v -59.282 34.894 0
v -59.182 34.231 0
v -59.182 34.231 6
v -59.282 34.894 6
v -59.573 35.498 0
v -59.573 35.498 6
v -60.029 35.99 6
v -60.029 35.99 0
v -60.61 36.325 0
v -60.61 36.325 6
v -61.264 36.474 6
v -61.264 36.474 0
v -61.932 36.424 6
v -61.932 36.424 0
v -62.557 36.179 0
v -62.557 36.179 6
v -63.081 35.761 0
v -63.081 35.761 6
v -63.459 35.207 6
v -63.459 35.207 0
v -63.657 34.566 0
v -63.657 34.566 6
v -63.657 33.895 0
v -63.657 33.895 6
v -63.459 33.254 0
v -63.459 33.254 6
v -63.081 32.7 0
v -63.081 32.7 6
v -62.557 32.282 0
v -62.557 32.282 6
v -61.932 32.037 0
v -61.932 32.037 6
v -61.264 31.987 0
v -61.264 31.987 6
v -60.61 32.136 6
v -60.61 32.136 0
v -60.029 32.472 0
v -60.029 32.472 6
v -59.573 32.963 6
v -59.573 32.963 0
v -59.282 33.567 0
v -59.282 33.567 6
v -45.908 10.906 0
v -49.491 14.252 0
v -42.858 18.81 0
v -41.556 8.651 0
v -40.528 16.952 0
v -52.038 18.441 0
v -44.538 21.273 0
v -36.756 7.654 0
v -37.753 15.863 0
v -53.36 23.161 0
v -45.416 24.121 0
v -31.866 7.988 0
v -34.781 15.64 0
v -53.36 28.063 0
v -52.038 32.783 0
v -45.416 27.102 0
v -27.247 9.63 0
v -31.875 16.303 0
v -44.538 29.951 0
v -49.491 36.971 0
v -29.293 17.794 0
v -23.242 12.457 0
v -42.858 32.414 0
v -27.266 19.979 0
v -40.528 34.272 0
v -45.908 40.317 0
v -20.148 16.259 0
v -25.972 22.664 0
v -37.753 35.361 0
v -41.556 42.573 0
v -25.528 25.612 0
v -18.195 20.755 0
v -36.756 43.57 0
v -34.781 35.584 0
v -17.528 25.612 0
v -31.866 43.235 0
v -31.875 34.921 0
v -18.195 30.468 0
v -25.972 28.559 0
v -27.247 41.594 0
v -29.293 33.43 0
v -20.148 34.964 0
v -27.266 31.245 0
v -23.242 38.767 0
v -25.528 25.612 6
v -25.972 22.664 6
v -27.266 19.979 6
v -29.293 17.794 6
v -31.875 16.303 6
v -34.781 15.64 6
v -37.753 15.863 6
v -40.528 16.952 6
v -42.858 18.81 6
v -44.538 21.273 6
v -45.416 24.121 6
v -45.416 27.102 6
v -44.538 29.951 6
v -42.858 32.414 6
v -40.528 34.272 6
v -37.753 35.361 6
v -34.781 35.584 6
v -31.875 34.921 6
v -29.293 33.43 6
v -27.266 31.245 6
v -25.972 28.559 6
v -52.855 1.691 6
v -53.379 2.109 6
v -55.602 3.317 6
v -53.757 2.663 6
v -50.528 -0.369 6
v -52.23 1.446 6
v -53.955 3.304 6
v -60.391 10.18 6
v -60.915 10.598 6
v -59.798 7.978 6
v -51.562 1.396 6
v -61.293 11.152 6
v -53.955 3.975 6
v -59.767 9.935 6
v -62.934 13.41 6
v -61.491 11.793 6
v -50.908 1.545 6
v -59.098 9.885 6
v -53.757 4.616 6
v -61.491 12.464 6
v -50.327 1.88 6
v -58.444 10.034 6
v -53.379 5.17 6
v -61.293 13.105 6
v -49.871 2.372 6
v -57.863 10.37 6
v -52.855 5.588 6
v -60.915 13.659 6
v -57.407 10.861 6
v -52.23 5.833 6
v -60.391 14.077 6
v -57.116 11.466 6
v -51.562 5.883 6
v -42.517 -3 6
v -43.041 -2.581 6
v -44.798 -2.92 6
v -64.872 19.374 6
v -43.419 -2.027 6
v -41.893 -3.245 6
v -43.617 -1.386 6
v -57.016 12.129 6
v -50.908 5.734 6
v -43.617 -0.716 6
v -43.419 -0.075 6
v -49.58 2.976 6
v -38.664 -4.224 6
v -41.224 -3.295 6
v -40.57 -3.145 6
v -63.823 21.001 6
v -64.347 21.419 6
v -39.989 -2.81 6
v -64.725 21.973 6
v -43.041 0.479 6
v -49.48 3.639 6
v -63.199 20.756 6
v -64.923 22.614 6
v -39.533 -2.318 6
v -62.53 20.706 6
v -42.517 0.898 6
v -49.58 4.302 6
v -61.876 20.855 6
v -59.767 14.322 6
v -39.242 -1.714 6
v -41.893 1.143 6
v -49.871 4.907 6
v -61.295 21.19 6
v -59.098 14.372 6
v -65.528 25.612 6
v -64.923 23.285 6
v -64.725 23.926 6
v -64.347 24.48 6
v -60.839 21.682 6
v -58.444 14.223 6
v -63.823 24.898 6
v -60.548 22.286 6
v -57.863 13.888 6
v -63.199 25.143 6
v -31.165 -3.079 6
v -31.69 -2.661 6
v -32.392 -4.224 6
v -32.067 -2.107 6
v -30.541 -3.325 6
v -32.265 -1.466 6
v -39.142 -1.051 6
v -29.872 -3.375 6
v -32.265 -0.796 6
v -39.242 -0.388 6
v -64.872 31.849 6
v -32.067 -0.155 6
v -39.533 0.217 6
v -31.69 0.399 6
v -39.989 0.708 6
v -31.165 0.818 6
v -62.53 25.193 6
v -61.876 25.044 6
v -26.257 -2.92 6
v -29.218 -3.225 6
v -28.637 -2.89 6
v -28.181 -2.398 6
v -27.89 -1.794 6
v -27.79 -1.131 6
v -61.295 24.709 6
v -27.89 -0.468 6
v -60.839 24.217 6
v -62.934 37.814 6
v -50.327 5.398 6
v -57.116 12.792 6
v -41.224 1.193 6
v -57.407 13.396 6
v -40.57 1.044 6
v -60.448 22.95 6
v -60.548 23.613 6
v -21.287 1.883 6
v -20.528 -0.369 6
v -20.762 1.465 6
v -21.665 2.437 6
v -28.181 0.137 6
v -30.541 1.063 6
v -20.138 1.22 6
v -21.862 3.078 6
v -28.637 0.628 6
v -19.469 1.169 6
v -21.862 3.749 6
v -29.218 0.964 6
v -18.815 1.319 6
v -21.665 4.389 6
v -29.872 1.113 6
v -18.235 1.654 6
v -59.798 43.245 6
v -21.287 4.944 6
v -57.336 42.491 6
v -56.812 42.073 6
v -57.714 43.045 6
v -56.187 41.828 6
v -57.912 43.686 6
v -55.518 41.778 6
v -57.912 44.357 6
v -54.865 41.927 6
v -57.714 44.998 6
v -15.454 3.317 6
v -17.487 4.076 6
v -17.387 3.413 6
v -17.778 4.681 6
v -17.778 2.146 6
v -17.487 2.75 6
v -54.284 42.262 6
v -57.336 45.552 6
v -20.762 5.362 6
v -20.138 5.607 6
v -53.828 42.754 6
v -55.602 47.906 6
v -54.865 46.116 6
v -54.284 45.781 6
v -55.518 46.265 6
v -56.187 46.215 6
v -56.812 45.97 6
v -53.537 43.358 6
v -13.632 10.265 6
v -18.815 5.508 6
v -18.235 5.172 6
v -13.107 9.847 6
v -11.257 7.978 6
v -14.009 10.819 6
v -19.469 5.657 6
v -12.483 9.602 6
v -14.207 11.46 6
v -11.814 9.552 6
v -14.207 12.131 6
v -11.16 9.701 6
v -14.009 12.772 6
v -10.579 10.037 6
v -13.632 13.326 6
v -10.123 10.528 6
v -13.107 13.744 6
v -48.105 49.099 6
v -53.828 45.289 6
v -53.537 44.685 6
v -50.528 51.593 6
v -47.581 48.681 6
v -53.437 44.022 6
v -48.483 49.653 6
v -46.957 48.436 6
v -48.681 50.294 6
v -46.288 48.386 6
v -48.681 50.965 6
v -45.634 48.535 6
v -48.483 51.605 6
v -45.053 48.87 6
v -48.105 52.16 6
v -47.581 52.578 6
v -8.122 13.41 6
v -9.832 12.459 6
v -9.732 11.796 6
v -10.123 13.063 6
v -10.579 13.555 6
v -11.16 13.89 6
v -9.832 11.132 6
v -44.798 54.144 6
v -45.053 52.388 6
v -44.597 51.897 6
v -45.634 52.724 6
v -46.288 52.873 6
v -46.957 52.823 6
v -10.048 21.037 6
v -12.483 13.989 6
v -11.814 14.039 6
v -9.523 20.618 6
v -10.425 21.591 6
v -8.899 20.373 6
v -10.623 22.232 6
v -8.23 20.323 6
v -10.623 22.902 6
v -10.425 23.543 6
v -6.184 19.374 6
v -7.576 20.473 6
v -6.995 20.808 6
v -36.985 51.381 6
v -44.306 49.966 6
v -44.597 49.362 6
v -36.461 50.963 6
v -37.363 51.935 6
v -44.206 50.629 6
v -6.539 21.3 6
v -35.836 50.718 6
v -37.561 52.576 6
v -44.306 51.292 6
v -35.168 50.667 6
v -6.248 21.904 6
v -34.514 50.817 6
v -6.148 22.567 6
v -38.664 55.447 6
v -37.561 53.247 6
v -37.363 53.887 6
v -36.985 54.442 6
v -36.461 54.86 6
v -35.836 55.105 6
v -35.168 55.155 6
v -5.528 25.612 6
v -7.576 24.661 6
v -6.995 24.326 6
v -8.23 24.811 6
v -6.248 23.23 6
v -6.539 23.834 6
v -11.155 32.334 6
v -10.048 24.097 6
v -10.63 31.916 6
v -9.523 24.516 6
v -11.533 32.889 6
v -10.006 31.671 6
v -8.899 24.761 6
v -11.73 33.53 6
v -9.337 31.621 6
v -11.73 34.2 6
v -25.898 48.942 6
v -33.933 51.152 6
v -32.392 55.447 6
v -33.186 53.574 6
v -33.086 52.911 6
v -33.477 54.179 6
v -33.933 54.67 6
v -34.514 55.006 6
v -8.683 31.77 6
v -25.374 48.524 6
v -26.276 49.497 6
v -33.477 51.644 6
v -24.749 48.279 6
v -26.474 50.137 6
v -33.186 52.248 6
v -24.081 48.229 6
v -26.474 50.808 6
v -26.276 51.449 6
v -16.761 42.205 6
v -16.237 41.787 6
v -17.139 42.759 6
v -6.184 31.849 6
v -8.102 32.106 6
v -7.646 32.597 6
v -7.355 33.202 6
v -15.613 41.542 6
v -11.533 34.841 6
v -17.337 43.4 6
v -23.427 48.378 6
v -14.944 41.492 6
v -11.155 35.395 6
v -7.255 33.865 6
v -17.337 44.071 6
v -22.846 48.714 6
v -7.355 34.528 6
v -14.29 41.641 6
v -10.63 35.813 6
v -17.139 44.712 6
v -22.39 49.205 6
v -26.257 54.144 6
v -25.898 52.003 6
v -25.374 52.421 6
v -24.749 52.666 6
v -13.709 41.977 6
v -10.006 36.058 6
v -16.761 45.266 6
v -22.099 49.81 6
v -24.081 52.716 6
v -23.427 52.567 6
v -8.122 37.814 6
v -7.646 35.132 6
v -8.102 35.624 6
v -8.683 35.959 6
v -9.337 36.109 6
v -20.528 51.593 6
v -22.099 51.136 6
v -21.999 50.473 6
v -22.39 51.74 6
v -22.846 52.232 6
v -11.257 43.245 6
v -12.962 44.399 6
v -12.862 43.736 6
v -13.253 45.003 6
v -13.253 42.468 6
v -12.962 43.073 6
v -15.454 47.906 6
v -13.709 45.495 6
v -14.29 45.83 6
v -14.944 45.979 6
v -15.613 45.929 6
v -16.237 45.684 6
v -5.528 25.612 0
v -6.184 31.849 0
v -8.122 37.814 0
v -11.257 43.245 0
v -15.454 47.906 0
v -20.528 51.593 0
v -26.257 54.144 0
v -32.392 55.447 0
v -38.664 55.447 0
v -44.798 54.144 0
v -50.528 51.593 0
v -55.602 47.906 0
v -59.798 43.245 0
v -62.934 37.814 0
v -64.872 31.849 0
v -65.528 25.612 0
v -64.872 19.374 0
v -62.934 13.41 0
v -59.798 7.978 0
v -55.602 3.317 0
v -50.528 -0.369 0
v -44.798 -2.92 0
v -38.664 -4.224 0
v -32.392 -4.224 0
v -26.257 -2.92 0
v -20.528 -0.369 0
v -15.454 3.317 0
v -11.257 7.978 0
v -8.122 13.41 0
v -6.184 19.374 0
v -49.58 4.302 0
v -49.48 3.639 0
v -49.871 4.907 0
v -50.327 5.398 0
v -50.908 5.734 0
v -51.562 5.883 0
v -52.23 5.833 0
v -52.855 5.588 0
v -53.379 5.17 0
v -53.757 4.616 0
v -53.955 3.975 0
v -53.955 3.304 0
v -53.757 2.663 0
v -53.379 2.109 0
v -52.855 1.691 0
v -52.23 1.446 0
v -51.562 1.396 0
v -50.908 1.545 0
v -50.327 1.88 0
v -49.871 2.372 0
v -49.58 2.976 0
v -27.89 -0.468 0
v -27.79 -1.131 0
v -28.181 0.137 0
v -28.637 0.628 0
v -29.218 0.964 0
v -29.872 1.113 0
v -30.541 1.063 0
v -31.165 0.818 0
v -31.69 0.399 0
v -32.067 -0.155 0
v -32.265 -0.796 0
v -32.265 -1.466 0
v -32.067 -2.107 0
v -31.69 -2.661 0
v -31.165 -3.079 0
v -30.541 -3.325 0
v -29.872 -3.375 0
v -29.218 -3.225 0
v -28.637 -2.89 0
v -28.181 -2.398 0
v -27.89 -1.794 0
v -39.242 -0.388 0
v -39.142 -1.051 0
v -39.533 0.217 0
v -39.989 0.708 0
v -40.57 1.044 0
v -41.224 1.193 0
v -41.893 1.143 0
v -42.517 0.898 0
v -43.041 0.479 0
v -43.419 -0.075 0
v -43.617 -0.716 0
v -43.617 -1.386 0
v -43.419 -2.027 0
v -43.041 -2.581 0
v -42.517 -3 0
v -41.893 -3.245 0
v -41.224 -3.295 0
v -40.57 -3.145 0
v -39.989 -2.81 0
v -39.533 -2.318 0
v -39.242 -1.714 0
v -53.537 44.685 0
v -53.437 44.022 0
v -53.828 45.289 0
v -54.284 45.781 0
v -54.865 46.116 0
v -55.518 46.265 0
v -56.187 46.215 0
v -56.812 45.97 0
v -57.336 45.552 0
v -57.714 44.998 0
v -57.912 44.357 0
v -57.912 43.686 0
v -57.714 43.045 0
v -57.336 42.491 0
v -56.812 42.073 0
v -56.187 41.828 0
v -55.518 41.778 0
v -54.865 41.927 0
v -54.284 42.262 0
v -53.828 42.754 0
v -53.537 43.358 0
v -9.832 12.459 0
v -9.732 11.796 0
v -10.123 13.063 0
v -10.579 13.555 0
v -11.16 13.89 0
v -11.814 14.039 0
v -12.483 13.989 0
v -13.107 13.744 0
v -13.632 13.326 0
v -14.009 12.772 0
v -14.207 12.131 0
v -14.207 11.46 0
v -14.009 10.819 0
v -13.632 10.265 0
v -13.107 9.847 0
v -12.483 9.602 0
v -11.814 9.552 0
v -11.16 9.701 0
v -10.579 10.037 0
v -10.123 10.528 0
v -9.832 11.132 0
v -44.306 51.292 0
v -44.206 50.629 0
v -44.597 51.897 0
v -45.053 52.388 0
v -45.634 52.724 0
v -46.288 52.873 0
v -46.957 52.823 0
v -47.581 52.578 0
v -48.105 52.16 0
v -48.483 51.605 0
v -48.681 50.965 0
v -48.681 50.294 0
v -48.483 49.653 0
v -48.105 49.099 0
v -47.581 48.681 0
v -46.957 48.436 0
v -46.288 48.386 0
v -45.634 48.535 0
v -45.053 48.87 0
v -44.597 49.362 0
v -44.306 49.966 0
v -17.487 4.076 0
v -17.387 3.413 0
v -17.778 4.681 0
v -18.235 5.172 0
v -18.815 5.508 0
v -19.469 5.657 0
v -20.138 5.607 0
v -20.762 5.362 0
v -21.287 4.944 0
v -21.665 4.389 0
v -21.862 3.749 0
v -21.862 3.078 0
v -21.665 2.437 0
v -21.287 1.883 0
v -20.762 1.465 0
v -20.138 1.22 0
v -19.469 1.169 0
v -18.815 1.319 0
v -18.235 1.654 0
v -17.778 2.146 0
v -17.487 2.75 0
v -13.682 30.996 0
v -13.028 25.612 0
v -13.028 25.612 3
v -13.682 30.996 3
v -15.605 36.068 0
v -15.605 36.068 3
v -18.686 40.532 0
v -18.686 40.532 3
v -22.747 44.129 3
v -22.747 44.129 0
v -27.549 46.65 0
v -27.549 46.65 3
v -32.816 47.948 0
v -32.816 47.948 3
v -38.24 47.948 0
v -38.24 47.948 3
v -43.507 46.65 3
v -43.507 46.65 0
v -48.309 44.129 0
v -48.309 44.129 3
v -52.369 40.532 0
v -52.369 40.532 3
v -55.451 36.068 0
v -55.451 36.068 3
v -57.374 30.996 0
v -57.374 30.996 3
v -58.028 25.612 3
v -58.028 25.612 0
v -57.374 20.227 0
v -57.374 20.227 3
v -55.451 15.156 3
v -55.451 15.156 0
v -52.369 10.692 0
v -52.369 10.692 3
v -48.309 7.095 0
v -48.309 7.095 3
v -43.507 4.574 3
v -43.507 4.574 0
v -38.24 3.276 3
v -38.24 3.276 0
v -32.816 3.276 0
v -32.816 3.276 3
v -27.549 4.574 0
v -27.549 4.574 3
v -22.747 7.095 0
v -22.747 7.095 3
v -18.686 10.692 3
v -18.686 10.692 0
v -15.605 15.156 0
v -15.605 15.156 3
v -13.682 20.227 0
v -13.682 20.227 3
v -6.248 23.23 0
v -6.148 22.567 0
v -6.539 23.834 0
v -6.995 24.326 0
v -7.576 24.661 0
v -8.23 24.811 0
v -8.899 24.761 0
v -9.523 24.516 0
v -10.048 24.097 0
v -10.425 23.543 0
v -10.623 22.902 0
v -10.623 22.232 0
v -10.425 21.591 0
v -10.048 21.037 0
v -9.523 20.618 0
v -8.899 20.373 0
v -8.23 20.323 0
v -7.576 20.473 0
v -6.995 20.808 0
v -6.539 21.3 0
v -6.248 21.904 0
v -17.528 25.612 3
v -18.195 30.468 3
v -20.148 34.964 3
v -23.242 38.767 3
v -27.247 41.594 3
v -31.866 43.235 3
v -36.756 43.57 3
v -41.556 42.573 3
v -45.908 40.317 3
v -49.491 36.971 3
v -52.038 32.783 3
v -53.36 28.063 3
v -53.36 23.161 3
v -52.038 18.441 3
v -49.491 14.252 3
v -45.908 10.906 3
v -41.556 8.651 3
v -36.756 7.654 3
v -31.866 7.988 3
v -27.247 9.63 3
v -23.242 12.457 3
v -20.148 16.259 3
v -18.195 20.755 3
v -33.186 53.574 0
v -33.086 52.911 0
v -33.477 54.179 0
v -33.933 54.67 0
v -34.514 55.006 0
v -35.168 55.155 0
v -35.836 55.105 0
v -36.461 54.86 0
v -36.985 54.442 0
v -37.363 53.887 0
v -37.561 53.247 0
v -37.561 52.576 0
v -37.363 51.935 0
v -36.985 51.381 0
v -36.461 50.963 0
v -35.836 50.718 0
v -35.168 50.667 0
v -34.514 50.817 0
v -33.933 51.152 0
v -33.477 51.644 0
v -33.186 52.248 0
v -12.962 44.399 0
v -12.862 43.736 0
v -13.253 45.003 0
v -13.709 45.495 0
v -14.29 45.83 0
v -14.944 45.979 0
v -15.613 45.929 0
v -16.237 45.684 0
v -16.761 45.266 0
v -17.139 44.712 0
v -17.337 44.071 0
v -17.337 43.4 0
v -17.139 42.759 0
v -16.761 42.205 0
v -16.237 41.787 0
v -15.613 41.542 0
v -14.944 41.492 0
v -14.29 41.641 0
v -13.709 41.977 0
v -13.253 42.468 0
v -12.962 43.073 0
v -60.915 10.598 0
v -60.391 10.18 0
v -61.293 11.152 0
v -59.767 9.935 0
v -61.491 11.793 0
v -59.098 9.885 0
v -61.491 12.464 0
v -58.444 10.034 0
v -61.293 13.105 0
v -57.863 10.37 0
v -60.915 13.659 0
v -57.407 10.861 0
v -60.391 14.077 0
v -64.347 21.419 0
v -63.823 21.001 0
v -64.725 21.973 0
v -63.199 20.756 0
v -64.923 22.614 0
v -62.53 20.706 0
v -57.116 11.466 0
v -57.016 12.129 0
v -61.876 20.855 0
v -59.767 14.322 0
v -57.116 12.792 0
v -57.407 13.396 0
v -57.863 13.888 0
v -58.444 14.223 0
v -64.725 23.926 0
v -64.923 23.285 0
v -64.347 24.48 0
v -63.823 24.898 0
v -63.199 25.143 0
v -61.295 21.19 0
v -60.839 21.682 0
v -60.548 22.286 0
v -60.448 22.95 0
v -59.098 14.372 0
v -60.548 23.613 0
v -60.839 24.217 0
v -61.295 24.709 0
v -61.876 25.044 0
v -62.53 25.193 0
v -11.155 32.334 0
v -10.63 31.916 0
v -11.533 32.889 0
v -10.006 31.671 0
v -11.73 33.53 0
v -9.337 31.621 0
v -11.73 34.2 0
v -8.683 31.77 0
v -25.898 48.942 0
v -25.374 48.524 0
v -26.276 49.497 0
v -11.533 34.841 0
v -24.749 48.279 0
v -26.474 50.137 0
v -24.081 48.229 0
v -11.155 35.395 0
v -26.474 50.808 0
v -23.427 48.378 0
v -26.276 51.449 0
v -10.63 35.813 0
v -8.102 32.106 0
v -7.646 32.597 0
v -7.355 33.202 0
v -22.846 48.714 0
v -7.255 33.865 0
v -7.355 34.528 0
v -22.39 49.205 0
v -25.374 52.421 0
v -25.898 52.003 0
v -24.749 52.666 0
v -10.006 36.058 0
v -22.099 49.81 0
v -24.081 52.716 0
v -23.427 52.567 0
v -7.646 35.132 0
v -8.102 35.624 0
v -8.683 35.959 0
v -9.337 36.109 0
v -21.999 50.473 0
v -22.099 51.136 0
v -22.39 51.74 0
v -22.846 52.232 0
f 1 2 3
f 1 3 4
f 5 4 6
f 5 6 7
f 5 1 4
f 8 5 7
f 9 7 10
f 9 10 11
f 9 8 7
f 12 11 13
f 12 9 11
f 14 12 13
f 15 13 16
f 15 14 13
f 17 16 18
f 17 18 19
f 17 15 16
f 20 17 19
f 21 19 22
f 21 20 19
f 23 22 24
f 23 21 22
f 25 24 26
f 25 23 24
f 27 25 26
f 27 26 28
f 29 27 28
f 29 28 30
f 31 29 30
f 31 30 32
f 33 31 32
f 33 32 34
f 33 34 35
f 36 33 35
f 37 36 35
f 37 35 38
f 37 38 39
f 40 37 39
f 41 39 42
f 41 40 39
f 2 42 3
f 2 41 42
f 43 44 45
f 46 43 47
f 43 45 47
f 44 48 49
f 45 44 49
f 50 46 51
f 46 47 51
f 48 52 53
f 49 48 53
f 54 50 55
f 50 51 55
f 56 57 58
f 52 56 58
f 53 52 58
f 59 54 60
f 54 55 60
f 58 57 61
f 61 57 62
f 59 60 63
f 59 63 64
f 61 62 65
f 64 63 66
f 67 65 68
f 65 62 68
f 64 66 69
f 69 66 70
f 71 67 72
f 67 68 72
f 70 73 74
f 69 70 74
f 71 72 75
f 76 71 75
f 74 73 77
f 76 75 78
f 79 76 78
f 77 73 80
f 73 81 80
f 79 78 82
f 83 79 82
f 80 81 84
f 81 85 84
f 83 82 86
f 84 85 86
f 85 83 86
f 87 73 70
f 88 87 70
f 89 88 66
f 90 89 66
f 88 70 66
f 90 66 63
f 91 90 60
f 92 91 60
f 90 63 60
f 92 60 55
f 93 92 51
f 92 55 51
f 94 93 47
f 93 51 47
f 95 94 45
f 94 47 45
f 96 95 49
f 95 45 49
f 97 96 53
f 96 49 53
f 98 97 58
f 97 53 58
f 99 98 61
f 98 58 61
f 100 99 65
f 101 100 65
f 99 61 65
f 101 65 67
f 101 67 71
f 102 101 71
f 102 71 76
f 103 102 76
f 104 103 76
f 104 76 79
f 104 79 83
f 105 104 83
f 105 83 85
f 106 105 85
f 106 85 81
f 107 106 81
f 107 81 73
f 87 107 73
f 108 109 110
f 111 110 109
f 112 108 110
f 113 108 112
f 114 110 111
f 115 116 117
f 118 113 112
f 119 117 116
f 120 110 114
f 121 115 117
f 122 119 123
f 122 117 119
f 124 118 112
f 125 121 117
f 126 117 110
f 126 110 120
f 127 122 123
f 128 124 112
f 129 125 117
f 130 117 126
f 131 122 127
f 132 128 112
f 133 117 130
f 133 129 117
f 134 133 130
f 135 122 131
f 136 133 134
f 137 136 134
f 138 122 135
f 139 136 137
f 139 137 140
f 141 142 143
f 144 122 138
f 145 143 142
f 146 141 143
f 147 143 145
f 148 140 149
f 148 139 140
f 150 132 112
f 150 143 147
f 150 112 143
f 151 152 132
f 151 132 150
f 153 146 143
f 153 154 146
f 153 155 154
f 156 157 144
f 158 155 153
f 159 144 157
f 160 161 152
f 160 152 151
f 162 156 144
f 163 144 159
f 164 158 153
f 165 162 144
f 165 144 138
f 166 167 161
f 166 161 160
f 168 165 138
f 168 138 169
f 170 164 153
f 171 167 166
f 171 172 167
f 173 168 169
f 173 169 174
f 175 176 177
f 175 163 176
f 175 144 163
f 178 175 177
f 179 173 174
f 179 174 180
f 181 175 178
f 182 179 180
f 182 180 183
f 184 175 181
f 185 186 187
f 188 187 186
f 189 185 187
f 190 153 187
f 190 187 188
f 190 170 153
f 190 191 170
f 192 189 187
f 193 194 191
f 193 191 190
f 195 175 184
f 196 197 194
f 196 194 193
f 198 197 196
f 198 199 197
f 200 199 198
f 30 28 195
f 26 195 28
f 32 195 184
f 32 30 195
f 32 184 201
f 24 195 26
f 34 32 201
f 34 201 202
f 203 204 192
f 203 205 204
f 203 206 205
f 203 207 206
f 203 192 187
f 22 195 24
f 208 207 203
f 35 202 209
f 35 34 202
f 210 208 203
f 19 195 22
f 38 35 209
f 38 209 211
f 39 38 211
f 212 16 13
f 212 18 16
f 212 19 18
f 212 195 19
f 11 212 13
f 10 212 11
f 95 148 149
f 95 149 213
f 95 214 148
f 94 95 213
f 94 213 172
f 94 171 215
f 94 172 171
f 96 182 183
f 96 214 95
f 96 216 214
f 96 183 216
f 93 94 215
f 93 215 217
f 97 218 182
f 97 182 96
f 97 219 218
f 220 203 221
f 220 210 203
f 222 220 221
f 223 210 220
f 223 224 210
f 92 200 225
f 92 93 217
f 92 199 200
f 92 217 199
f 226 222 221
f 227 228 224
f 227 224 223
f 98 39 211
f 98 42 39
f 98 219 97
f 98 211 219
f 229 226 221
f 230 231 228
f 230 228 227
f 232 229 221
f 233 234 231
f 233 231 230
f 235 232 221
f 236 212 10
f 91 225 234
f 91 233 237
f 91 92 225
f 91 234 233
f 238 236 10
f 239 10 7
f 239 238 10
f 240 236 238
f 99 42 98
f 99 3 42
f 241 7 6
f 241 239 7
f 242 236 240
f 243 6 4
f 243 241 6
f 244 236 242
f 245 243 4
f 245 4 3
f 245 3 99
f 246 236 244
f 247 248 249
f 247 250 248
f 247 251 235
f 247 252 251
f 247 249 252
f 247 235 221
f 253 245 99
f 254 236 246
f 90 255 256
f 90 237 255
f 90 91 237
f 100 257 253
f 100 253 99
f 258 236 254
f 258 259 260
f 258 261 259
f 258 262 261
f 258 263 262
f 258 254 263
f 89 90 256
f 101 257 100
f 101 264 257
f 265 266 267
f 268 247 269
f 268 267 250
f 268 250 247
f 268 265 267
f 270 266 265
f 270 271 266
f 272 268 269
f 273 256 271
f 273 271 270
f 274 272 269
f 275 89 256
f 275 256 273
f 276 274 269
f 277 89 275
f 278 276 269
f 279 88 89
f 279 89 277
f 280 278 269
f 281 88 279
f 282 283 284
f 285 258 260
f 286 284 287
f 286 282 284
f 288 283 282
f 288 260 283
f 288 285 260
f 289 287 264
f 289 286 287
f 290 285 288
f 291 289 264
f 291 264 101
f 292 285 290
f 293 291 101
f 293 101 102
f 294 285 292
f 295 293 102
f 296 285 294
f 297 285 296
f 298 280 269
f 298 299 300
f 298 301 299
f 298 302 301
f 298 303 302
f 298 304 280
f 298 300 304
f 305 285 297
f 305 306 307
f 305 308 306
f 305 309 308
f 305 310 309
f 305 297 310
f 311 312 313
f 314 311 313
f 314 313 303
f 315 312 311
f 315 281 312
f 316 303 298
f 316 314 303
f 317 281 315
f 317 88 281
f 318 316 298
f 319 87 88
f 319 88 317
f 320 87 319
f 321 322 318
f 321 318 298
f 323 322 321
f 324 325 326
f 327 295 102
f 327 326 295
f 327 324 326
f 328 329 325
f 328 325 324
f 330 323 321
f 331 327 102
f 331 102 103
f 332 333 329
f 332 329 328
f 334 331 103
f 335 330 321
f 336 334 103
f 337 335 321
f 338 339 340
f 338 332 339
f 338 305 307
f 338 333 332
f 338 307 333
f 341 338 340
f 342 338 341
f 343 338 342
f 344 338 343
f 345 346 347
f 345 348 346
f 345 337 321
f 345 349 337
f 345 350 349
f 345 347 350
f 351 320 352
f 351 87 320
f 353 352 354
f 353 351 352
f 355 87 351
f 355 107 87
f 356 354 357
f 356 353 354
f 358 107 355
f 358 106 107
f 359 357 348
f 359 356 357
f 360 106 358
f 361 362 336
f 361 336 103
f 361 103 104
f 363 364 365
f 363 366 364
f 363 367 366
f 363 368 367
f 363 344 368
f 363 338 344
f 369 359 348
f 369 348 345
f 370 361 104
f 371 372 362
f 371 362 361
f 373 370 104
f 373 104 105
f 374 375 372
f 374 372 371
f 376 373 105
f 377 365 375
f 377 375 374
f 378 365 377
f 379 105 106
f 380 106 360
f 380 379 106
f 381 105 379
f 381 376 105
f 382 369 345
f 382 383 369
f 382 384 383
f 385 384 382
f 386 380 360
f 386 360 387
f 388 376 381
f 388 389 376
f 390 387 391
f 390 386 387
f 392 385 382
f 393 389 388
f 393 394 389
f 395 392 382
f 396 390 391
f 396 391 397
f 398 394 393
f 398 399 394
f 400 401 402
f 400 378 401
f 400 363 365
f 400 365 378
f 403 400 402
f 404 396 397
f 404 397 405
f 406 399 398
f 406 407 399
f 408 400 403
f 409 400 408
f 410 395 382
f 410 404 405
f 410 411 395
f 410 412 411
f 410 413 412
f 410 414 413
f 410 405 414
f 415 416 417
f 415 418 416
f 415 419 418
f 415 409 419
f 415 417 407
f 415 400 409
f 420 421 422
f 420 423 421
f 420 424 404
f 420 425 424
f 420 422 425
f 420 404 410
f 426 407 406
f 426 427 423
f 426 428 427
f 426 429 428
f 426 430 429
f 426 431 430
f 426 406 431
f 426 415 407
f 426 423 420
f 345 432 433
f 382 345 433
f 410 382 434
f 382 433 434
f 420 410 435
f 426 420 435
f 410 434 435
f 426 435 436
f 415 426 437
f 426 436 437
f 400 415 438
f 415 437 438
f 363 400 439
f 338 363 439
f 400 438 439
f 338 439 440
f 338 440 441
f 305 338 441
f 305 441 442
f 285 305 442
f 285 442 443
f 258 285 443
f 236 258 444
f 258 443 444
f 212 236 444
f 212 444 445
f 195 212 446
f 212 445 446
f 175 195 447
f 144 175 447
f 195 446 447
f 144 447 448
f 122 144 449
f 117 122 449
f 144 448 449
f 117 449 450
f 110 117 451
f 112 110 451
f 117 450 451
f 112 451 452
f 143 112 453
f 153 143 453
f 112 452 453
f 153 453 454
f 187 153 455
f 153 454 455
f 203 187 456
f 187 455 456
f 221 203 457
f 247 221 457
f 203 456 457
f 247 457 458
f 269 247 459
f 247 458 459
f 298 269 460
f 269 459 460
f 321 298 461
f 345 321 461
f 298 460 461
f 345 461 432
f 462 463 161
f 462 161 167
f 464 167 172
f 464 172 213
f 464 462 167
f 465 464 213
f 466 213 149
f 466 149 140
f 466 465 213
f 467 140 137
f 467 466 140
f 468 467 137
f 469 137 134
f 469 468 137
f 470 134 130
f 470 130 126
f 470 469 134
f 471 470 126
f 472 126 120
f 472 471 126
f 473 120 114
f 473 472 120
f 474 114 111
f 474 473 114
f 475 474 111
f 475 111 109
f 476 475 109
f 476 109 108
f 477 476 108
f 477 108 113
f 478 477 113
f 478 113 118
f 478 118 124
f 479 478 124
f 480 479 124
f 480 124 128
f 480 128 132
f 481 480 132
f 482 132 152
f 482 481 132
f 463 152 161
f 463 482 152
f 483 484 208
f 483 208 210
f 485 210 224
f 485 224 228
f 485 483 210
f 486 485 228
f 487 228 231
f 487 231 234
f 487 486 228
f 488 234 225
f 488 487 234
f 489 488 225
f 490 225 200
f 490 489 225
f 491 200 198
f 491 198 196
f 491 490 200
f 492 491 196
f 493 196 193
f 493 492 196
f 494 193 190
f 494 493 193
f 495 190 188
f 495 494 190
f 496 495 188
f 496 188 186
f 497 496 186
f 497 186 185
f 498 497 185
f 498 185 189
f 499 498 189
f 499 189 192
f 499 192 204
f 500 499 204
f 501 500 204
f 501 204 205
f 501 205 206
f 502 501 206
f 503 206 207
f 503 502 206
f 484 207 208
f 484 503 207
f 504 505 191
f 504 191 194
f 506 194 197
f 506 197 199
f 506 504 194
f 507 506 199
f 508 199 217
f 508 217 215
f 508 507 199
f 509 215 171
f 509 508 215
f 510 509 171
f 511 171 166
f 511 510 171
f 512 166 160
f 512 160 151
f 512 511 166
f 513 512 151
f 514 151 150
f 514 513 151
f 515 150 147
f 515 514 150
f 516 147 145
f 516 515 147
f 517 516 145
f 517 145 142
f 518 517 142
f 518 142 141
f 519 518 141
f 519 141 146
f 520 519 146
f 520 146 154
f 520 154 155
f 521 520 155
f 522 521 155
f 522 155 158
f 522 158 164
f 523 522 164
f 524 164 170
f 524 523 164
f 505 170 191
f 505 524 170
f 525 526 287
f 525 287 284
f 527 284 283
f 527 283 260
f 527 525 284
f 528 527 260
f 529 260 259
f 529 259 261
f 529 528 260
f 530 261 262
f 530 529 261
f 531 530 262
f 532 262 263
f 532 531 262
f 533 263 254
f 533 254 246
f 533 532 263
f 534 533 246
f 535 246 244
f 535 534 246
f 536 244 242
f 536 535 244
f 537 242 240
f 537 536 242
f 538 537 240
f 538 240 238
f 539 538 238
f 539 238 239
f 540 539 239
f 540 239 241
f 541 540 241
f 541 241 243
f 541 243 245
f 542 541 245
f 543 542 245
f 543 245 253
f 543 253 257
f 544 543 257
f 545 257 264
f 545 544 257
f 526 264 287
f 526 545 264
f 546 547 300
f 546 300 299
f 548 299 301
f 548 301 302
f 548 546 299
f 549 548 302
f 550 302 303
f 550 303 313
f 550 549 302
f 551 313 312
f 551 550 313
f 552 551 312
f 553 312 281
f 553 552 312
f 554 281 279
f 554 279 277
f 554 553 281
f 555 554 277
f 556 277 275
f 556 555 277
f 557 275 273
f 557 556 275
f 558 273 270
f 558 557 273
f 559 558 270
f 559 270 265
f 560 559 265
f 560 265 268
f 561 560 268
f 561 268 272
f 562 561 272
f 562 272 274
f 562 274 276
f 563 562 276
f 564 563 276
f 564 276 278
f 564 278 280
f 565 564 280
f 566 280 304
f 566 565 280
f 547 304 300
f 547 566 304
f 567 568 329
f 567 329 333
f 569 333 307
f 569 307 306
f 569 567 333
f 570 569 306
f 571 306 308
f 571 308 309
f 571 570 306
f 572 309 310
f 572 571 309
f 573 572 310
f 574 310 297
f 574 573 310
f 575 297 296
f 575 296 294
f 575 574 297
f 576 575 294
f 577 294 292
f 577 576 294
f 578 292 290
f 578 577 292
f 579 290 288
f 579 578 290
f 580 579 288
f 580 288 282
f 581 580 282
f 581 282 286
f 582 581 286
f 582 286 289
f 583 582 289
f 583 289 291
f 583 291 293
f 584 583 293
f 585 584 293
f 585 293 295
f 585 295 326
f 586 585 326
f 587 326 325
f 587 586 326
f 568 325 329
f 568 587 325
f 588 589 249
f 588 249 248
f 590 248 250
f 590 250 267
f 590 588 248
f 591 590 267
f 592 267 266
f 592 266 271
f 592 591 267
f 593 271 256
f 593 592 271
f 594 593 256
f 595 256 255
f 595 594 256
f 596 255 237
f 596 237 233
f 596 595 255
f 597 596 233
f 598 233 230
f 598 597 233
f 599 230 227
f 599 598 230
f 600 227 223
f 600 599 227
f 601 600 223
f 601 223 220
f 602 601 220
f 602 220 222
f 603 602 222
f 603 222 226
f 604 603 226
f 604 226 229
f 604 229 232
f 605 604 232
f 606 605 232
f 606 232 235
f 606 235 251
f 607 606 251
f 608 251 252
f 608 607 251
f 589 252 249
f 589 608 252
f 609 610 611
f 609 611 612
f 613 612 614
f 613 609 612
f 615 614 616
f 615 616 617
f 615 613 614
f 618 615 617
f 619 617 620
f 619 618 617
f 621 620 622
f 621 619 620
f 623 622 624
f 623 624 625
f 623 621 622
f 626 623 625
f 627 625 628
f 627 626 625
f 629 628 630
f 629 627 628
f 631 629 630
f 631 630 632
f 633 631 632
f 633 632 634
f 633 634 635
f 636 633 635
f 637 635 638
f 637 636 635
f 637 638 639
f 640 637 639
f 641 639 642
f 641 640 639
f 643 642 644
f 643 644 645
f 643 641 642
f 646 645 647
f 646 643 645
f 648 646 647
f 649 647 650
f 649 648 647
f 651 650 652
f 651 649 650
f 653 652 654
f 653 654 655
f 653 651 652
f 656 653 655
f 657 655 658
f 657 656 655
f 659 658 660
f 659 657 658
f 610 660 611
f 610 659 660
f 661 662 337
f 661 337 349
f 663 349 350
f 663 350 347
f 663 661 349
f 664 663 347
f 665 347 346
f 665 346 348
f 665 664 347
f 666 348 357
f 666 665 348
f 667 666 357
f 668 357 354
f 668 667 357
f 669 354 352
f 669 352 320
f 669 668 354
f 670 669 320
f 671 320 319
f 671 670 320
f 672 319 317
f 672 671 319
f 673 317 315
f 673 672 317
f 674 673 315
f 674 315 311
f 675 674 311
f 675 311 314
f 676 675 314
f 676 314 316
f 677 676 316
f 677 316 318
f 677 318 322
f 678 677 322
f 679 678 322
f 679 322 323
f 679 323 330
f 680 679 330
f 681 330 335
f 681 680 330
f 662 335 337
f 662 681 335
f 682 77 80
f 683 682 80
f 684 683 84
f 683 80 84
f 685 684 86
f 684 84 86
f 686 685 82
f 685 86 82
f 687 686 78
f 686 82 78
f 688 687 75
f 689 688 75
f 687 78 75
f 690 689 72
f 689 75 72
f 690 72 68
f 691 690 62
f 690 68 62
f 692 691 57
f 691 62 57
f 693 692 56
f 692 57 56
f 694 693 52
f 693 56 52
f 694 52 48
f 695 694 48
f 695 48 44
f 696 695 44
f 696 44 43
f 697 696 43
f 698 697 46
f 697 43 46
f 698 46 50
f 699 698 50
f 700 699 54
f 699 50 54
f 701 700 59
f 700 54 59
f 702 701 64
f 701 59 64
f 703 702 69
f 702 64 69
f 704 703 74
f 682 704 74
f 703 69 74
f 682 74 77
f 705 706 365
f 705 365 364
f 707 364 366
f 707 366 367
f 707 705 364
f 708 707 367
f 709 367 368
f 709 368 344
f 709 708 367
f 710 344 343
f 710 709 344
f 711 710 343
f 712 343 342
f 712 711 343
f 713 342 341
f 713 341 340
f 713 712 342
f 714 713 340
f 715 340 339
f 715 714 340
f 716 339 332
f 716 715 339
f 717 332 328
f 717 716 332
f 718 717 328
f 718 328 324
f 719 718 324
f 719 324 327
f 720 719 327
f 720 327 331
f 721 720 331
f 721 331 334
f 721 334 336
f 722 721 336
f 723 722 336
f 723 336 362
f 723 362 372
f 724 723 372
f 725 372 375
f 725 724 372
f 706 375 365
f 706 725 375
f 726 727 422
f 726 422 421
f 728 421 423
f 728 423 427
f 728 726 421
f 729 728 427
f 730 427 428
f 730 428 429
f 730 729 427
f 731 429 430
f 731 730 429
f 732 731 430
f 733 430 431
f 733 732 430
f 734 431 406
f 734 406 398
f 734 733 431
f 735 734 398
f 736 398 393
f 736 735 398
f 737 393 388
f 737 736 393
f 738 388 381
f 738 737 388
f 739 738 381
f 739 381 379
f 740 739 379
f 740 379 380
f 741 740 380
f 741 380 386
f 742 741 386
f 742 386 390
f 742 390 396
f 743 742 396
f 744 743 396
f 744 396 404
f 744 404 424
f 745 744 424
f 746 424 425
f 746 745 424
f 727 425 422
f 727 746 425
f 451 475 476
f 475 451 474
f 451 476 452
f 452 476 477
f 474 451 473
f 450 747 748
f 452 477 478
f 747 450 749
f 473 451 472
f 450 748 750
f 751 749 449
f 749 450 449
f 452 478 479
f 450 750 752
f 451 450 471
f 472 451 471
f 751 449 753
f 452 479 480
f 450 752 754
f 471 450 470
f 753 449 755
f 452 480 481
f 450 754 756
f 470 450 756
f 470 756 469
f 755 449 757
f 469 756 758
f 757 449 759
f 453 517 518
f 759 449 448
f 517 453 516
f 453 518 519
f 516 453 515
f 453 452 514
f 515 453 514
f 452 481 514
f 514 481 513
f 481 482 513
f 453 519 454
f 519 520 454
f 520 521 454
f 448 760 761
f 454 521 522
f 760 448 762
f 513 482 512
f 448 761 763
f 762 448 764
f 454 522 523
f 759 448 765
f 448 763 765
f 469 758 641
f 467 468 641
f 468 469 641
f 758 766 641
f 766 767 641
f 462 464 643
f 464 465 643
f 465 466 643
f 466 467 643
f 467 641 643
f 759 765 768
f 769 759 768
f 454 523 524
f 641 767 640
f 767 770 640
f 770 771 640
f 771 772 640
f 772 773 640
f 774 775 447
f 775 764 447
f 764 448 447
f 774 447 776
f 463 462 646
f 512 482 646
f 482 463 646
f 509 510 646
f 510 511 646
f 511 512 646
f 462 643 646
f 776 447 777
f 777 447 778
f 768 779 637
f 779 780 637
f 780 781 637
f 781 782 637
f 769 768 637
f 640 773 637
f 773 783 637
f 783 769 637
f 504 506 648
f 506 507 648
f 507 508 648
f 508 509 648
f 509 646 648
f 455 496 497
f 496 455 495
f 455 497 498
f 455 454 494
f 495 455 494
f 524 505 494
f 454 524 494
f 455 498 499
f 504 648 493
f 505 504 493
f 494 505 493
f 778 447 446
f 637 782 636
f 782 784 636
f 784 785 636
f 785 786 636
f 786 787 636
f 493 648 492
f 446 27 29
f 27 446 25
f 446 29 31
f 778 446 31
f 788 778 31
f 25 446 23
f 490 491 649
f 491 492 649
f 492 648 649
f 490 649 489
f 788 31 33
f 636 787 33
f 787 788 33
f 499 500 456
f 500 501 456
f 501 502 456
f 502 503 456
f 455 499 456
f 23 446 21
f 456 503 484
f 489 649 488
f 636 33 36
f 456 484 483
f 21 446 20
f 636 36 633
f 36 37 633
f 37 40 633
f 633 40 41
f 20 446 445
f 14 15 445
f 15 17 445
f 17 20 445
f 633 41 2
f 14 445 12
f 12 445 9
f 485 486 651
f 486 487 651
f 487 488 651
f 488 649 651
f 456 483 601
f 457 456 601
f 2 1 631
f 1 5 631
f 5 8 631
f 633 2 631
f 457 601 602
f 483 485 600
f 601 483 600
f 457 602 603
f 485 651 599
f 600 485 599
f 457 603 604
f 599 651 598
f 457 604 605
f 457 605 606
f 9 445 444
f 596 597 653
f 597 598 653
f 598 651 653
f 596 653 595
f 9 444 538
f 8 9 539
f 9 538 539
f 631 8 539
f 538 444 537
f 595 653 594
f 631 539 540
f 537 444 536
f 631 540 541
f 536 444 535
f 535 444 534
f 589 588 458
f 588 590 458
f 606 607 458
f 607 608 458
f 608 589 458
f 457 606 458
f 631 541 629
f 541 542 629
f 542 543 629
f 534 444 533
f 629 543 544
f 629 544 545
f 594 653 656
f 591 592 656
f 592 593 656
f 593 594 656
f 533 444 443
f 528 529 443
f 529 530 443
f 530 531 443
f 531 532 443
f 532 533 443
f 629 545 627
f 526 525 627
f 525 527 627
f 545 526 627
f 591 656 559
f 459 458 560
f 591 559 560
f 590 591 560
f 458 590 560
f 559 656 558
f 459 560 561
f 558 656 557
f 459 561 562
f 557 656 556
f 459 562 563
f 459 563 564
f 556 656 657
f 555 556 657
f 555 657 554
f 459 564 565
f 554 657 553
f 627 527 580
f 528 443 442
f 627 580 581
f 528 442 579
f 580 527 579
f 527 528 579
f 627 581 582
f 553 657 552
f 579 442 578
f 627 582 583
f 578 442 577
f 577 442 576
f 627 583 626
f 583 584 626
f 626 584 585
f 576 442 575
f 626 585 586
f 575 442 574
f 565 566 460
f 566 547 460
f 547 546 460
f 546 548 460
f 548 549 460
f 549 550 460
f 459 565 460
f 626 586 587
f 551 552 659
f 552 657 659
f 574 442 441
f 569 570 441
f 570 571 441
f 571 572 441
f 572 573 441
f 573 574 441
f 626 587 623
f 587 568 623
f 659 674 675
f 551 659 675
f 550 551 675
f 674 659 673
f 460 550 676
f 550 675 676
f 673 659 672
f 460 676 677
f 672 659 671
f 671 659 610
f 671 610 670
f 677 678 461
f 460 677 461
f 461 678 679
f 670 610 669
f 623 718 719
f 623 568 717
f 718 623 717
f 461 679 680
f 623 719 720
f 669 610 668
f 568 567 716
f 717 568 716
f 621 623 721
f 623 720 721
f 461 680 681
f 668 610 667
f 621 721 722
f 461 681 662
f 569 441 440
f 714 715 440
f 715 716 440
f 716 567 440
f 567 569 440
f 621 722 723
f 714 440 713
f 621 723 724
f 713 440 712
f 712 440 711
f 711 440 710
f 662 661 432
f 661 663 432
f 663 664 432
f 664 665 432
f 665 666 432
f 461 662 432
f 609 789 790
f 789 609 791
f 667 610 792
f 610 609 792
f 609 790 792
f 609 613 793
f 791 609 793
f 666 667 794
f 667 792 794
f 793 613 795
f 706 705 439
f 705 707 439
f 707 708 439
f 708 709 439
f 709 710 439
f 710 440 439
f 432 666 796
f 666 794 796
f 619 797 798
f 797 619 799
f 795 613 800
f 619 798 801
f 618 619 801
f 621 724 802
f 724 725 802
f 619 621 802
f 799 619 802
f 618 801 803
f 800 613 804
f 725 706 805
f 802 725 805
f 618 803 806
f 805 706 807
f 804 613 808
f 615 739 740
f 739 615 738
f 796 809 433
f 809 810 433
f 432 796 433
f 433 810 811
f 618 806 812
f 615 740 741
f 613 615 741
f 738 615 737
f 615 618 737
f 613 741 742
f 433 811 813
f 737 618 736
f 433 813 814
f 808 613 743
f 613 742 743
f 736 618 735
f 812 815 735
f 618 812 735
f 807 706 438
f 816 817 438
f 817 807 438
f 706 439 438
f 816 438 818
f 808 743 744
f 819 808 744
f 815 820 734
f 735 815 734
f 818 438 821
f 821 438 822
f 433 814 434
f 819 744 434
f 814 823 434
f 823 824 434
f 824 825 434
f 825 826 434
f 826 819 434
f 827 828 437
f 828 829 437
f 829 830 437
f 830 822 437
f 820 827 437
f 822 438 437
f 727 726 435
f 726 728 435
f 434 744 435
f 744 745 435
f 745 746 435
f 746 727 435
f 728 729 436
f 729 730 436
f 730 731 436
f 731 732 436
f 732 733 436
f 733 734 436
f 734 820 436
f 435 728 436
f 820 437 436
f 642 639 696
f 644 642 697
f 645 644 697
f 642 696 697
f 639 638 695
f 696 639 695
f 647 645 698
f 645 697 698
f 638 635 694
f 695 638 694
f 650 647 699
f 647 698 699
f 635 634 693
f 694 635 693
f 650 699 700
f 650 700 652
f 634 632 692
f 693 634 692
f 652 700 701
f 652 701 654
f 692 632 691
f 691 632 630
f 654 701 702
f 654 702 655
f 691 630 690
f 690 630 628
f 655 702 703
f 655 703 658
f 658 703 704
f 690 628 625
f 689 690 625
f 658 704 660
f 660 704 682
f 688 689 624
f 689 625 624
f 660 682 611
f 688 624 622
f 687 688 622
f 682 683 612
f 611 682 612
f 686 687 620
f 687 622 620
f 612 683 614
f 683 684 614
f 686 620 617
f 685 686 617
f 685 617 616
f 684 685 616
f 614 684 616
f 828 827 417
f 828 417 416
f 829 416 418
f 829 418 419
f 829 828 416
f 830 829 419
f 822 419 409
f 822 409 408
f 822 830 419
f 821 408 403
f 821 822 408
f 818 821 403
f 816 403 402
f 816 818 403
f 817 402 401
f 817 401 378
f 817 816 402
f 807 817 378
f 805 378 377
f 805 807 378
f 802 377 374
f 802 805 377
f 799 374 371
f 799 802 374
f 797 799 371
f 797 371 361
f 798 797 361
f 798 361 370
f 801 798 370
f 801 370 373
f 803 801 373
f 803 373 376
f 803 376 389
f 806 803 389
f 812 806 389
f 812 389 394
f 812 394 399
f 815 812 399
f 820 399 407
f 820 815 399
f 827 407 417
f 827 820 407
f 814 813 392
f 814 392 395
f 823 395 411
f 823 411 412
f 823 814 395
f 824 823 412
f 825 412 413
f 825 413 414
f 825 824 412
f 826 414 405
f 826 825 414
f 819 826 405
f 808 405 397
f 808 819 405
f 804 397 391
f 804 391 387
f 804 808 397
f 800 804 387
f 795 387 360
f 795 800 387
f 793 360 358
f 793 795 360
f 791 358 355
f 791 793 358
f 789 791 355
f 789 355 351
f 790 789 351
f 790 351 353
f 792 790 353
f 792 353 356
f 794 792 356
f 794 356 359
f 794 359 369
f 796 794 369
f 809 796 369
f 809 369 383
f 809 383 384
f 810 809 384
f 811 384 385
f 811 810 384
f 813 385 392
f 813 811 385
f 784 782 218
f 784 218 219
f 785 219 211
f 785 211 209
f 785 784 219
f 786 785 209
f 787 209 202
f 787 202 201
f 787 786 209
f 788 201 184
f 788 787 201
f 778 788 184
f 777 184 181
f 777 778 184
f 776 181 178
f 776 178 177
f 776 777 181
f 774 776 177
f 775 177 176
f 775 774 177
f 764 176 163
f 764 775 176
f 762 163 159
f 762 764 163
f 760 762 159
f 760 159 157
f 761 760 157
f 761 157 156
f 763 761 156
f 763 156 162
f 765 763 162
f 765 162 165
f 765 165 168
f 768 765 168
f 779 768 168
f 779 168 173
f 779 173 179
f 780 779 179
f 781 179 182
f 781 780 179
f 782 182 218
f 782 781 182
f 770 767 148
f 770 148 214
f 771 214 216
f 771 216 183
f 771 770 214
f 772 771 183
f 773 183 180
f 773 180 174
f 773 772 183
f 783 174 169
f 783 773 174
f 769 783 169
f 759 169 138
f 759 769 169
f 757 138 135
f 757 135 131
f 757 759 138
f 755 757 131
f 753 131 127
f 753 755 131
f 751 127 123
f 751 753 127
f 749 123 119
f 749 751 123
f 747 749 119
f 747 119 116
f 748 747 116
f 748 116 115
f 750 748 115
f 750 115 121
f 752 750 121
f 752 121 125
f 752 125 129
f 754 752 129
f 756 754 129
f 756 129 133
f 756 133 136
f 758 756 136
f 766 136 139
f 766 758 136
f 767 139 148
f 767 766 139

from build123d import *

# Parameters (mm, degrees)
F0_R     = 22.5
F0_R_2   = 18
F1_DEPTH = 3
F2_R     = 30
F2_R_2   = 2.25
F3_DEPTH = 6
F4_DEPTH = 3
F5_R     = 10
F6_DEPTH = 10


with BuildPart() as f1:
    # F0 (on Top) → F1 (new body)
    with BuildSketch(Plane.XY):
        with Locations((-35.527975389, 25.6118375491)):
            Circle(F0_R)
        with Locations((-35.527975389, 25.6118375491)):
            Circle(F0_R_2, mode=Mode.SUBTRACT)
    extrude(amount=F1_DEPTH)


with BuildPart() as f3:
    # F2 (on Top) → F3 (new body)
    with BuildSketch(Plane.XY):
        with Locations((-35.527975389, 25.6118375491)):
            Circle(F2_R)
        with Locations((-51.7297042582, 3.6392641531)):
            Circle(F2_R_2, mode=Mode.SUBTRACT)
        with Locations((-41.3919404606, -1.0509438819)):
            Circle(F2_R_2, mode=Mode.SUBTRACT)
        with Locations((-59.2660419463, 12.1287297427)):
            Circle(F2_R_2, mode=Mode.SUBTRACT)
        with Locations((-62.697852273, 22.9495471623)):
            Circle(F2_R_2, mode=Mode.SUBTRACT)
        with Locations((-30.0402438296, -1.1309147837)):
            Circle(F2_R_2, mode=Mode.SUBTRACT)
        with Locations((-19.6374258397, 3.4131791432)):
            Circle(F2_R_2, mode=Mode.SUBTRACT)
        with Locations((-11.982228228, 11.7956227769)):
            Circle(F2_R_2, mode=Mode.SUBTRACT)
        with Locations((-8.3983042068, 22.5670154611)):
            Circle(F2_R_2, mode=Mode.SUBTRACT)
        with Locations((-61.4317440559, 34.230698776)):
            Circle(F2_R_2, mode=Mode.SUBTRACT)
        with Locations((-55.686638908, 44.0215709836)):
            Circle(F2_R_2, mode=Mode.SUBTRACT)
        with Locations((-46.4559177018, 50.6292330332)):
            Circle(F2_R_2, mode=Mode.SUBTRACT)
        with Locations((-9.5053467983, 33.8648855457)):
            Circle(F2_R_2, mode=Mode.SUBTRACT)
        with Locations((-35.3356559926, 52.9111601277)):
            Circle(F2_R_2, mode=Mode.SUBTRACT)
        with Locations((-24.2486480541, 50.4727863418)):
            Circle(F2_R_2, mode=Mode.SUBTRACT)
        with Locations((-15.1119382813, 43.7357286551)):
            Circle(F2_R_2, mode=Mode.SUBTRACT)
    extrude(amount=F3_DEPTH)


with BuildPart() as f4_tool:
    # F0 (on Top) → F4 (new body)
    with BuildSketch(Plane.XY):
        with Locations((-35.527975389, 25.6118375491)):
            Circle(F0_R)
        with Locations((-35.527975389, 25.6118375491)):
            Circle(F0_R_2, mode=Mode.SUBTRACT)
    extrude(amount=F4_DEPTH)


with BuildPart() as f1_1:
    add(f1.part)

    # F4: cut by f4_tool
    add(f4_tool.part, mode=Mode.SUBTRACT)


with BuildPart() as f3_1:
    add(f3.part)

    # F4: cut by f4_tool
    add(f4_tool.part, mode=Mode.SUBTRACT)

    # F5 (on face) → F6 (cut)
    with BuildSketch(Plane(origin=(0, 0, 0), x_dir=(1, 0, 0), z_dir=(0, 0, -1))):
        with Locations((-35.527975389, -25.6118375491)):
            Circle(F5_R)
    extrude(amount=-F6_DEPTH, mode=Mode.SUBTRACT)


solid = f3_1.part
